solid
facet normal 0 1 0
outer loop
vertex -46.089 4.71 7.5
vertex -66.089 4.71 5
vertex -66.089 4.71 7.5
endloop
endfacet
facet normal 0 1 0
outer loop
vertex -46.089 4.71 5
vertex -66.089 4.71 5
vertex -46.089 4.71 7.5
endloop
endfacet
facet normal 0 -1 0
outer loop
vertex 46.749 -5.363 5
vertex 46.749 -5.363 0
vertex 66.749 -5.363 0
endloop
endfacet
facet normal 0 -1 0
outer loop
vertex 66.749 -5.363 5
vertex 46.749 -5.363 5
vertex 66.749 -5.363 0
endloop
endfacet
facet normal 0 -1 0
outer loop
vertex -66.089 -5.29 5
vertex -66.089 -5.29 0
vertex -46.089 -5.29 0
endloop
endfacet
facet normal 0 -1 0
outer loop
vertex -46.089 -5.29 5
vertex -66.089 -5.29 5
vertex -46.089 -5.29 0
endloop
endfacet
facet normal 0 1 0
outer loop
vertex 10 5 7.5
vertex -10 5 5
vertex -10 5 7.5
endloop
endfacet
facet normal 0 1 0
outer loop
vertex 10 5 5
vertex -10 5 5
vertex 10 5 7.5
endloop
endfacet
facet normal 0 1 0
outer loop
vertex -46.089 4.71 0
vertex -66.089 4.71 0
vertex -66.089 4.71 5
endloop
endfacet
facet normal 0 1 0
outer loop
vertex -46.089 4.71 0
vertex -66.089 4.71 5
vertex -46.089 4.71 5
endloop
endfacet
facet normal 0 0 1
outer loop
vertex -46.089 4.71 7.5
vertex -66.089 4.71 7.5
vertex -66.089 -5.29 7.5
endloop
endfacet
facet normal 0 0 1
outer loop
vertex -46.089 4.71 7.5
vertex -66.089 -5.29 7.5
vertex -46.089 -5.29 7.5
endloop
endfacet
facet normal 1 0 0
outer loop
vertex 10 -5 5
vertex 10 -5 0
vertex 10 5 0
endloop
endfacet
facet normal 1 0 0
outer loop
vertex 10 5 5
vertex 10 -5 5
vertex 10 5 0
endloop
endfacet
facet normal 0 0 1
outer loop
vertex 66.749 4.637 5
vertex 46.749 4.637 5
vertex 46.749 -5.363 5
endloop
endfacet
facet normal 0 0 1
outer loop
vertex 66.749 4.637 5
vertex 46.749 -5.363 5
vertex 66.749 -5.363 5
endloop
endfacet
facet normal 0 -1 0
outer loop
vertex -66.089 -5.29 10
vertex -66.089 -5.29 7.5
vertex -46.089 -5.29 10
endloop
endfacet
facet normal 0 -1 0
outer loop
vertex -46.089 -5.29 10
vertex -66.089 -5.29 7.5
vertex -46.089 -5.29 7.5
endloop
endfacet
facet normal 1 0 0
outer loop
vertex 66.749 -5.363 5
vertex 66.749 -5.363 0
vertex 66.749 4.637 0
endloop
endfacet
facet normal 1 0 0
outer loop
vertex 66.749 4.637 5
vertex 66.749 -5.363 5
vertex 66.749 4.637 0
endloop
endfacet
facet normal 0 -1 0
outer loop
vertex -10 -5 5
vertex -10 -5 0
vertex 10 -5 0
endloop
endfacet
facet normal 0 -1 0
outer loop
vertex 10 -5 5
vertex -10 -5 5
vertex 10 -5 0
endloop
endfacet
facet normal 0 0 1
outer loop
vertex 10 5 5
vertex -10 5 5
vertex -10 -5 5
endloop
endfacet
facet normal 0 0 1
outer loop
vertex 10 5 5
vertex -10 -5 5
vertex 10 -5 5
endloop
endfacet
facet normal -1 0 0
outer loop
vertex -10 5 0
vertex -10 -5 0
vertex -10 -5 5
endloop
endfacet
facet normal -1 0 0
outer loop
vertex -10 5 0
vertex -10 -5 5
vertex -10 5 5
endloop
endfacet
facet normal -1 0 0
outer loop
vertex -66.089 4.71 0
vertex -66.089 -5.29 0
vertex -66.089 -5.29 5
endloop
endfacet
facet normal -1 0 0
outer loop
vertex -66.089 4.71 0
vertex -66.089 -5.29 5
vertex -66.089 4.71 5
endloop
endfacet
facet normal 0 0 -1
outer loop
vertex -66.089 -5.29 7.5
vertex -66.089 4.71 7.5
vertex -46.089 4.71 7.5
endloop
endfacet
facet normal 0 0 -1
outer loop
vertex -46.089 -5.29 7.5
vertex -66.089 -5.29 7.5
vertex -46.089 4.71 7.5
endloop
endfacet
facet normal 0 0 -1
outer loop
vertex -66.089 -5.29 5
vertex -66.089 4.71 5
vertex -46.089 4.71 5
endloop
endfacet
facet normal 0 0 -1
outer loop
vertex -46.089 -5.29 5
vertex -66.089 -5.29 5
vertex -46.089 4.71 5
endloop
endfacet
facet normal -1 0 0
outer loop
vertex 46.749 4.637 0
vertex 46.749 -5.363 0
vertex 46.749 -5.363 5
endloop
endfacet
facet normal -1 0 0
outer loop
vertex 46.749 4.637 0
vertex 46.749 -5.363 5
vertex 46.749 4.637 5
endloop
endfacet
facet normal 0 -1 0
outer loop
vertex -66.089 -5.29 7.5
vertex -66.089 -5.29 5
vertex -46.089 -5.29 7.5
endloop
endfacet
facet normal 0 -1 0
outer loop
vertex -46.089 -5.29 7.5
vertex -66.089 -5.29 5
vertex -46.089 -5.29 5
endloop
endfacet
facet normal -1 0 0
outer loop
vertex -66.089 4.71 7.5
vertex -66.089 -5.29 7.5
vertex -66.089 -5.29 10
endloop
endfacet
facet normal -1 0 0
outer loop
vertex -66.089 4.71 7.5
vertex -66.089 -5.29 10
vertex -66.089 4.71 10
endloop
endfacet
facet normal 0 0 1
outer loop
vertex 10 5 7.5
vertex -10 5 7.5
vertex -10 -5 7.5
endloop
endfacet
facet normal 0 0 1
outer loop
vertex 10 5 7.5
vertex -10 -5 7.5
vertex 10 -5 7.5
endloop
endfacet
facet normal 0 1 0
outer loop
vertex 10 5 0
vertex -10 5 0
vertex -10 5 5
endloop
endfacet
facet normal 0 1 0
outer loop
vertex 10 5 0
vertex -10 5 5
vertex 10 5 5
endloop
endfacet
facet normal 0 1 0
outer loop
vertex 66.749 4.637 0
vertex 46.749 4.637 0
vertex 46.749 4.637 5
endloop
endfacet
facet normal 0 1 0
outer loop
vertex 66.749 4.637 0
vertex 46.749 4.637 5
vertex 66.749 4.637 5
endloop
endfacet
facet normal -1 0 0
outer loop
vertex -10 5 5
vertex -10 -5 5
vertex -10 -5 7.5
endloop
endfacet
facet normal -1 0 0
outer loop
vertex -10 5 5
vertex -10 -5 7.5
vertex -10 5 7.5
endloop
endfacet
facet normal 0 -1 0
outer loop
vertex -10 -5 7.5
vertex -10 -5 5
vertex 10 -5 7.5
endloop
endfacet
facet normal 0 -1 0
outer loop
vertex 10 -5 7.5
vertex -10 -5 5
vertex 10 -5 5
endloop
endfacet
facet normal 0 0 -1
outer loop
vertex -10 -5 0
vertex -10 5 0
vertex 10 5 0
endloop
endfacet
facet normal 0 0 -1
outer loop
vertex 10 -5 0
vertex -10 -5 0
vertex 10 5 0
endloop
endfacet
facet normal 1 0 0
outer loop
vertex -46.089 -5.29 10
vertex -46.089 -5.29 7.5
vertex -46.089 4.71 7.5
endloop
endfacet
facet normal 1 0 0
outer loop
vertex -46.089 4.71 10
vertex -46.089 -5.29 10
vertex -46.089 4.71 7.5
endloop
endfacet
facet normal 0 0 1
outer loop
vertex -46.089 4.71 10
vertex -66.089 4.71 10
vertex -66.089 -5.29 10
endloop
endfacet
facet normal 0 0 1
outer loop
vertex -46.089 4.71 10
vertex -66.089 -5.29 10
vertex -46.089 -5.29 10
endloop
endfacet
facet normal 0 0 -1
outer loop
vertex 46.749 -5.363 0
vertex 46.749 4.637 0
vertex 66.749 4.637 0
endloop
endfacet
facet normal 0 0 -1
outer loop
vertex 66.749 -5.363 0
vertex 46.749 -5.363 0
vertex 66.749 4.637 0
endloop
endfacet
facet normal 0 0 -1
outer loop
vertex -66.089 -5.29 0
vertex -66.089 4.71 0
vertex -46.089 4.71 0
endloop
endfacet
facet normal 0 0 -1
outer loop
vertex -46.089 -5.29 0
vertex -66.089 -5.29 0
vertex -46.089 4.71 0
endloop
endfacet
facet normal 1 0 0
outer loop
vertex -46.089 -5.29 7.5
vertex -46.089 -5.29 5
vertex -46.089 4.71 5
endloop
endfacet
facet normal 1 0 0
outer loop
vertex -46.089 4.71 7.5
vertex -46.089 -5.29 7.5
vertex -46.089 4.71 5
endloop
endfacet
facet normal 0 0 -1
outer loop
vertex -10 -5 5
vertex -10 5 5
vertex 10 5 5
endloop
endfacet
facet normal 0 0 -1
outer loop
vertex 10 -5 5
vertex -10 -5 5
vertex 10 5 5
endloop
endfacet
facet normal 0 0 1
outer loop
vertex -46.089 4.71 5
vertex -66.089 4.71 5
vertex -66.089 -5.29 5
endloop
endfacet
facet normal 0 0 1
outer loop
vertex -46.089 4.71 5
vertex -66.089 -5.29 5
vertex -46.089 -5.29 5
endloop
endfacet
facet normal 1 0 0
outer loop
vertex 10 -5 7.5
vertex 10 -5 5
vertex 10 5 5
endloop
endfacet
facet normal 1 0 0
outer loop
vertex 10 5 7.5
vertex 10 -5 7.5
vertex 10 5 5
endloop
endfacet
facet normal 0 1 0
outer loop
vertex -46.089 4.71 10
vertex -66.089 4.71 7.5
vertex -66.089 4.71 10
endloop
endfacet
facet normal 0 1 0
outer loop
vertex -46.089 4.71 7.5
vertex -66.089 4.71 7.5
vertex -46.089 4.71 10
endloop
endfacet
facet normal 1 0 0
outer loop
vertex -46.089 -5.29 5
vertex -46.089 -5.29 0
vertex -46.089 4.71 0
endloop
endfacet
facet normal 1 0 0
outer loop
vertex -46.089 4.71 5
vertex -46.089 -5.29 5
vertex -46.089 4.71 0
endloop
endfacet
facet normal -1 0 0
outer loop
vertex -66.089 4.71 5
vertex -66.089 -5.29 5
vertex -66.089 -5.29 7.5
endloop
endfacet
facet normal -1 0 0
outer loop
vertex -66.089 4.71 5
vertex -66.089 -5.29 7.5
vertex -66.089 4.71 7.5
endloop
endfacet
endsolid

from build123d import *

# Parameters (mm, degrees)
F0_W      = 20
F0_H      = 10
F1_DEPTH  = 5
F2_W      = 20
F2_H      = 10
F3_DEPTH  = 5
F4_W      = 20
F4_H      = 10
F5_DEPTH  = 2.5
F6_W      = 20
F6_H      = 10
F7_DEPTH  = 2.5
F10_W     = 20
F10_H     = 10
F11_DEPTH = 5
F12_W     = 20
F12_H     = 10
F13_DEPTH = 2.5


with BuildPart() as f1:
    # F0 (on Top) → F1 (new body)
    with BuildSketch(Plane.XY):
        with Locations((-56.0887241736, -0.2901825937)):
            Rectangle(F0_W, F0_H)
    extrude(amount=F1_DEPTH)


with BuildPart() as f3:
    # F2 (on Top) → F3 (new body)
    with BuildSketch(Plane.XY):
        with Locations((56.7486034706, -0.3627343103)):
            Rectangle(F2_W, F2_H)
    extrude(amount=F3_DEPTH)


with BuildPart() as f5:
    # F4 (on face) → F5 (new body)
    with BuildSketch(Plane.XY.offset(5)):
        with Locations((-56.0887241736, -0.2901825937)):
            Rectangle(F4_W, F4_H)
    extrude(amount=F5_DEPTH)


with BuildPart() as f7:
    # F6 (on face) → F7 (new body)
    with BuildSketch(Plane.XY.offset(7.5)):
        with Locations((-56.0887241736, -0.2901825937)):
            Rectangle(F6_W, F6_H)
    extrude(amount=F7_DEPTH)


with BuildPart() as f8_1:
    # F8: copy of F3
    add(f3.part.moved(Location((5, 5, 5))))


with BuildPart() as f11:
    # F10 (on Top) → F11 (new body)
    with BuildSketch(Plane.XY):
        Rectangle(F10_W, F10_H)
    extrude(amount=F11_DEPTH)


with BuildPart() as f13:
    # F12 (on face) → F13 (new body)
    with BuildSketch(Plane.XY.offset(5)):
        Rectangle(F12_W, F12_H)
    extrude(amount=F13_DEPTH)


solid = Compound([f1.part, f3.part, f5.part, f7.part, f11.part, f13.part])
